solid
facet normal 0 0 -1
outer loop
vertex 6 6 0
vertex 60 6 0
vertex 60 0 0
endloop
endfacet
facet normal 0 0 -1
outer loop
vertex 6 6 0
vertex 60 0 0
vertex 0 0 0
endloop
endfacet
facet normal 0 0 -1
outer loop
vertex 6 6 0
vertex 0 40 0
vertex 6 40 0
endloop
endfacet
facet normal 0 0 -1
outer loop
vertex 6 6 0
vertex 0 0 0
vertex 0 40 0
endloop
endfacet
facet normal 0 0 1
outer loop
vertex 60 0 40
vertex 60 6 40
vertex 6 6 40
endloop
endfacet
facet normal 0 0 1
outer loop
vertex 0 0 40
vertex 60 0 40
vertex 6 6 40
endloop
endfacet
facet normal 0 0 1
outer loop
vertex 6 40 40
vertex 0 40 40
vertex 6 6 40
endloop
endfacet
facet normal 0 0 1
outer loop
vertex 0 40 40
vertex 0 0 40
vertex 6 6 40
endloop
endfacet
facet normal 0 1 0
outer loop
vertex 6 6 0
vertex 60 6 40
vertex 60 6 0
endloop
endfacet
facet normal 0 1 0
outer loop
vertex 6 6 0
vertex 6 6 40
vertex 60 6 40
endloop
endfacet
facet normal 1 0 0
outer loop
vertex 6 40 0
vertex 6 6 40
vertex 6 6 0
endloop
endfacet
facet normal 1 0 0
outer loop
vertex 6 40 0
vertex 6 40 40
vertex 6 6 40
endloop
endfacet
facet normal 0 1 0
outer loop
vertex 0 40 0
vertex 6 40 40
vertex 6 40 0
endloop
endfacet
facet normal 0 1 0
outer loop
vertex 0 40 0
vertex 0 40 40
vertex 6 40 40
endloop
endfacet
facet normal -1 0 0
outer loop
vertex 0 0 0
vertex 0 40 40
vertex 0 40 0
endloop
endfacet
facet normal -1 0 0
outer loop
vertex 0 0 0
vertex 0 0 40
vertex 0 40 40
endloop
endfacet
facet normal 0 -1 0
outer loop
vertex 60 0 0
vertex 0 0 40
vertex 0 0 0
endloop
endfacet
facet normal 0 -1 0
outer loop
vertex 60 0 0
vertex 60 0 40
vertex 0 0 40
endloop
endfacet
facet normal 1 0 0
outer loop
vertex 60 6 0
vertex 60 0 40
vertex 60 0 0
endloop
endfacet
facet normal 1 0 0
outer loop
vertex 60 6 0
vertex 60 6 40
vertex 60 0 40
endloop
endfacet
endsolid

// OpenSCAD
$fn = 32;

// ----------------------------------------------------------------------
// Structural section: angle 60 x 40 mm
// ----------------------------------------------------------------------

// --- parameters (mm) ---
sec_w = 60;               // leg width, X
sec_h = 40;               // leg height, Y
flange_t = 6;             // leg thickness
plate_t = 40;             // cut length, Z (extrusion height)

profile = [[0, 0], [60, 0], [60, 6], [6, 6], [6, 40], [0, 40]];  // primary outline, 6 points, counter clockwise

// --- the one profile operation ---
linear_extrude(height = plate_t) polygon(points = profile);
